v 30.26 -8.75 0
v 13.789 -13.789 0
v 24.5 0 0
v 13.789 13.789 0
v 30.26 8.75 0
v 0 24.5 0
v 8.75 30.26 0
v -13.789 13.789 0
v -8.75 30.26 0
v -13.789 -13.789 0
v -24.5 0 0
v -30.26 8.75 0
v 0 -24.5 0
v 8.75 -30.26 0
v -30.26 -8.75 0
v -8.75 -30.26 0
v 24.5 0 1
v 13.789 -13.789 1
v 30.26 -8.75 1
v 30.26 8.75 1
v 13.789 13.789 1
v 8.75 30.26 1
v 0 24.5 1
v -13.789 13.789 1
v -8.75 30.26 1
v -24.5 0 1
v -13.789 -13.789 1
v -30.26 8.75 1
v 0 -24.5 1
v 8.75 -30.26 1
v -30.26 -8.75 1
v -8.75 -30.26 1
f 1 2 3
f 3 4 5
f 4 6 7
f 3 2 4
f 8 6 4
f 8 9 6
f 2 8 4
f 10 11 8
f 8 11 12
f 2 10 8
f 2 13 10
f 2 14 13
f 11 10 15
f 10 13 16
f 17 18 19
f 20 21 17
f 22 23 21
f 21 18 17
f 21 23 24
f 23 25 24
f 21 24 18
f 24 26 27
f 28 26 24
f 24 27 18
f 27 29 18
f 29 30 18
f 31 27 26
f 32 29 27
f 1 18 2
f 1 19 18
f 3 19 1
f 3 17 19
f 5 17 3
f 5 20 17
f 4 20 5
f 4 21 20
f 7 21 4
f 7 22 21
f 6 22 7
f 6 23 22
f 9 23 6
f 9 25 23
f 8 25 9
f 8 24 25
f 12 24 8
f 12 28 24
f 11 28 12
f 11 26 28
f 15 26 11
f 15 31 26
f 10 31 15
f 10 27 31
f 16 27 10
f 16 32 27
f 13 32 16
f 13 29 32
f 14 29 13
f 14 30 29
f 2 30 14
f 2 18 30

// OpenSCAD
// Generated by Parametrix
ca_myPartL_face1_000 = [ [ 24.5000, 0.0000 ],[ 30.2603, 8.7500 ],[ 13.7886, 13.7886 ],[ 8.7500, 30.2603 ],[ 0.0000, 24.5000 ],[ -8.7500, 30.2603 ],[ -13.7886, 13.7886 ],[ -30.2603, 8.7500 ],[ -24.5000, 0.0000 ],[ -30.2603, -8.7500 ],[ -13.7886, -13.7886 ],[ -8.7500, -30.2603 ],[ -0.0000, -24.5000 ],[ 8.7500, -30.2603 ],[ 13.7886, -13.7886 ],[ 30.2603, -8.7500 ],[ 24.5000, -0.0000 ] ];
cb_myPartL_face1_000 = [  0, 1, 2, 3, 4, 5, 6, 7, 8, 9, 10, 11, 12, 13, 14, 15, 16 ];
a_myPartL_face1 = concat(ca_myPartL_face1_000);
b_myPartL_face1 = [cb_myPartL_face1_000];

module subpax_myPartL () {
	translate( [ 0, 0, 0 ])
		rotate( [ 0, 0, 0 ])
			   linear_extrude(height = 1) polygon(a_myPartL_face1, b_myPartL_face1);
}

module pax_myPartL () {
	subpax_myPartL();
}

pax_myPartL();
